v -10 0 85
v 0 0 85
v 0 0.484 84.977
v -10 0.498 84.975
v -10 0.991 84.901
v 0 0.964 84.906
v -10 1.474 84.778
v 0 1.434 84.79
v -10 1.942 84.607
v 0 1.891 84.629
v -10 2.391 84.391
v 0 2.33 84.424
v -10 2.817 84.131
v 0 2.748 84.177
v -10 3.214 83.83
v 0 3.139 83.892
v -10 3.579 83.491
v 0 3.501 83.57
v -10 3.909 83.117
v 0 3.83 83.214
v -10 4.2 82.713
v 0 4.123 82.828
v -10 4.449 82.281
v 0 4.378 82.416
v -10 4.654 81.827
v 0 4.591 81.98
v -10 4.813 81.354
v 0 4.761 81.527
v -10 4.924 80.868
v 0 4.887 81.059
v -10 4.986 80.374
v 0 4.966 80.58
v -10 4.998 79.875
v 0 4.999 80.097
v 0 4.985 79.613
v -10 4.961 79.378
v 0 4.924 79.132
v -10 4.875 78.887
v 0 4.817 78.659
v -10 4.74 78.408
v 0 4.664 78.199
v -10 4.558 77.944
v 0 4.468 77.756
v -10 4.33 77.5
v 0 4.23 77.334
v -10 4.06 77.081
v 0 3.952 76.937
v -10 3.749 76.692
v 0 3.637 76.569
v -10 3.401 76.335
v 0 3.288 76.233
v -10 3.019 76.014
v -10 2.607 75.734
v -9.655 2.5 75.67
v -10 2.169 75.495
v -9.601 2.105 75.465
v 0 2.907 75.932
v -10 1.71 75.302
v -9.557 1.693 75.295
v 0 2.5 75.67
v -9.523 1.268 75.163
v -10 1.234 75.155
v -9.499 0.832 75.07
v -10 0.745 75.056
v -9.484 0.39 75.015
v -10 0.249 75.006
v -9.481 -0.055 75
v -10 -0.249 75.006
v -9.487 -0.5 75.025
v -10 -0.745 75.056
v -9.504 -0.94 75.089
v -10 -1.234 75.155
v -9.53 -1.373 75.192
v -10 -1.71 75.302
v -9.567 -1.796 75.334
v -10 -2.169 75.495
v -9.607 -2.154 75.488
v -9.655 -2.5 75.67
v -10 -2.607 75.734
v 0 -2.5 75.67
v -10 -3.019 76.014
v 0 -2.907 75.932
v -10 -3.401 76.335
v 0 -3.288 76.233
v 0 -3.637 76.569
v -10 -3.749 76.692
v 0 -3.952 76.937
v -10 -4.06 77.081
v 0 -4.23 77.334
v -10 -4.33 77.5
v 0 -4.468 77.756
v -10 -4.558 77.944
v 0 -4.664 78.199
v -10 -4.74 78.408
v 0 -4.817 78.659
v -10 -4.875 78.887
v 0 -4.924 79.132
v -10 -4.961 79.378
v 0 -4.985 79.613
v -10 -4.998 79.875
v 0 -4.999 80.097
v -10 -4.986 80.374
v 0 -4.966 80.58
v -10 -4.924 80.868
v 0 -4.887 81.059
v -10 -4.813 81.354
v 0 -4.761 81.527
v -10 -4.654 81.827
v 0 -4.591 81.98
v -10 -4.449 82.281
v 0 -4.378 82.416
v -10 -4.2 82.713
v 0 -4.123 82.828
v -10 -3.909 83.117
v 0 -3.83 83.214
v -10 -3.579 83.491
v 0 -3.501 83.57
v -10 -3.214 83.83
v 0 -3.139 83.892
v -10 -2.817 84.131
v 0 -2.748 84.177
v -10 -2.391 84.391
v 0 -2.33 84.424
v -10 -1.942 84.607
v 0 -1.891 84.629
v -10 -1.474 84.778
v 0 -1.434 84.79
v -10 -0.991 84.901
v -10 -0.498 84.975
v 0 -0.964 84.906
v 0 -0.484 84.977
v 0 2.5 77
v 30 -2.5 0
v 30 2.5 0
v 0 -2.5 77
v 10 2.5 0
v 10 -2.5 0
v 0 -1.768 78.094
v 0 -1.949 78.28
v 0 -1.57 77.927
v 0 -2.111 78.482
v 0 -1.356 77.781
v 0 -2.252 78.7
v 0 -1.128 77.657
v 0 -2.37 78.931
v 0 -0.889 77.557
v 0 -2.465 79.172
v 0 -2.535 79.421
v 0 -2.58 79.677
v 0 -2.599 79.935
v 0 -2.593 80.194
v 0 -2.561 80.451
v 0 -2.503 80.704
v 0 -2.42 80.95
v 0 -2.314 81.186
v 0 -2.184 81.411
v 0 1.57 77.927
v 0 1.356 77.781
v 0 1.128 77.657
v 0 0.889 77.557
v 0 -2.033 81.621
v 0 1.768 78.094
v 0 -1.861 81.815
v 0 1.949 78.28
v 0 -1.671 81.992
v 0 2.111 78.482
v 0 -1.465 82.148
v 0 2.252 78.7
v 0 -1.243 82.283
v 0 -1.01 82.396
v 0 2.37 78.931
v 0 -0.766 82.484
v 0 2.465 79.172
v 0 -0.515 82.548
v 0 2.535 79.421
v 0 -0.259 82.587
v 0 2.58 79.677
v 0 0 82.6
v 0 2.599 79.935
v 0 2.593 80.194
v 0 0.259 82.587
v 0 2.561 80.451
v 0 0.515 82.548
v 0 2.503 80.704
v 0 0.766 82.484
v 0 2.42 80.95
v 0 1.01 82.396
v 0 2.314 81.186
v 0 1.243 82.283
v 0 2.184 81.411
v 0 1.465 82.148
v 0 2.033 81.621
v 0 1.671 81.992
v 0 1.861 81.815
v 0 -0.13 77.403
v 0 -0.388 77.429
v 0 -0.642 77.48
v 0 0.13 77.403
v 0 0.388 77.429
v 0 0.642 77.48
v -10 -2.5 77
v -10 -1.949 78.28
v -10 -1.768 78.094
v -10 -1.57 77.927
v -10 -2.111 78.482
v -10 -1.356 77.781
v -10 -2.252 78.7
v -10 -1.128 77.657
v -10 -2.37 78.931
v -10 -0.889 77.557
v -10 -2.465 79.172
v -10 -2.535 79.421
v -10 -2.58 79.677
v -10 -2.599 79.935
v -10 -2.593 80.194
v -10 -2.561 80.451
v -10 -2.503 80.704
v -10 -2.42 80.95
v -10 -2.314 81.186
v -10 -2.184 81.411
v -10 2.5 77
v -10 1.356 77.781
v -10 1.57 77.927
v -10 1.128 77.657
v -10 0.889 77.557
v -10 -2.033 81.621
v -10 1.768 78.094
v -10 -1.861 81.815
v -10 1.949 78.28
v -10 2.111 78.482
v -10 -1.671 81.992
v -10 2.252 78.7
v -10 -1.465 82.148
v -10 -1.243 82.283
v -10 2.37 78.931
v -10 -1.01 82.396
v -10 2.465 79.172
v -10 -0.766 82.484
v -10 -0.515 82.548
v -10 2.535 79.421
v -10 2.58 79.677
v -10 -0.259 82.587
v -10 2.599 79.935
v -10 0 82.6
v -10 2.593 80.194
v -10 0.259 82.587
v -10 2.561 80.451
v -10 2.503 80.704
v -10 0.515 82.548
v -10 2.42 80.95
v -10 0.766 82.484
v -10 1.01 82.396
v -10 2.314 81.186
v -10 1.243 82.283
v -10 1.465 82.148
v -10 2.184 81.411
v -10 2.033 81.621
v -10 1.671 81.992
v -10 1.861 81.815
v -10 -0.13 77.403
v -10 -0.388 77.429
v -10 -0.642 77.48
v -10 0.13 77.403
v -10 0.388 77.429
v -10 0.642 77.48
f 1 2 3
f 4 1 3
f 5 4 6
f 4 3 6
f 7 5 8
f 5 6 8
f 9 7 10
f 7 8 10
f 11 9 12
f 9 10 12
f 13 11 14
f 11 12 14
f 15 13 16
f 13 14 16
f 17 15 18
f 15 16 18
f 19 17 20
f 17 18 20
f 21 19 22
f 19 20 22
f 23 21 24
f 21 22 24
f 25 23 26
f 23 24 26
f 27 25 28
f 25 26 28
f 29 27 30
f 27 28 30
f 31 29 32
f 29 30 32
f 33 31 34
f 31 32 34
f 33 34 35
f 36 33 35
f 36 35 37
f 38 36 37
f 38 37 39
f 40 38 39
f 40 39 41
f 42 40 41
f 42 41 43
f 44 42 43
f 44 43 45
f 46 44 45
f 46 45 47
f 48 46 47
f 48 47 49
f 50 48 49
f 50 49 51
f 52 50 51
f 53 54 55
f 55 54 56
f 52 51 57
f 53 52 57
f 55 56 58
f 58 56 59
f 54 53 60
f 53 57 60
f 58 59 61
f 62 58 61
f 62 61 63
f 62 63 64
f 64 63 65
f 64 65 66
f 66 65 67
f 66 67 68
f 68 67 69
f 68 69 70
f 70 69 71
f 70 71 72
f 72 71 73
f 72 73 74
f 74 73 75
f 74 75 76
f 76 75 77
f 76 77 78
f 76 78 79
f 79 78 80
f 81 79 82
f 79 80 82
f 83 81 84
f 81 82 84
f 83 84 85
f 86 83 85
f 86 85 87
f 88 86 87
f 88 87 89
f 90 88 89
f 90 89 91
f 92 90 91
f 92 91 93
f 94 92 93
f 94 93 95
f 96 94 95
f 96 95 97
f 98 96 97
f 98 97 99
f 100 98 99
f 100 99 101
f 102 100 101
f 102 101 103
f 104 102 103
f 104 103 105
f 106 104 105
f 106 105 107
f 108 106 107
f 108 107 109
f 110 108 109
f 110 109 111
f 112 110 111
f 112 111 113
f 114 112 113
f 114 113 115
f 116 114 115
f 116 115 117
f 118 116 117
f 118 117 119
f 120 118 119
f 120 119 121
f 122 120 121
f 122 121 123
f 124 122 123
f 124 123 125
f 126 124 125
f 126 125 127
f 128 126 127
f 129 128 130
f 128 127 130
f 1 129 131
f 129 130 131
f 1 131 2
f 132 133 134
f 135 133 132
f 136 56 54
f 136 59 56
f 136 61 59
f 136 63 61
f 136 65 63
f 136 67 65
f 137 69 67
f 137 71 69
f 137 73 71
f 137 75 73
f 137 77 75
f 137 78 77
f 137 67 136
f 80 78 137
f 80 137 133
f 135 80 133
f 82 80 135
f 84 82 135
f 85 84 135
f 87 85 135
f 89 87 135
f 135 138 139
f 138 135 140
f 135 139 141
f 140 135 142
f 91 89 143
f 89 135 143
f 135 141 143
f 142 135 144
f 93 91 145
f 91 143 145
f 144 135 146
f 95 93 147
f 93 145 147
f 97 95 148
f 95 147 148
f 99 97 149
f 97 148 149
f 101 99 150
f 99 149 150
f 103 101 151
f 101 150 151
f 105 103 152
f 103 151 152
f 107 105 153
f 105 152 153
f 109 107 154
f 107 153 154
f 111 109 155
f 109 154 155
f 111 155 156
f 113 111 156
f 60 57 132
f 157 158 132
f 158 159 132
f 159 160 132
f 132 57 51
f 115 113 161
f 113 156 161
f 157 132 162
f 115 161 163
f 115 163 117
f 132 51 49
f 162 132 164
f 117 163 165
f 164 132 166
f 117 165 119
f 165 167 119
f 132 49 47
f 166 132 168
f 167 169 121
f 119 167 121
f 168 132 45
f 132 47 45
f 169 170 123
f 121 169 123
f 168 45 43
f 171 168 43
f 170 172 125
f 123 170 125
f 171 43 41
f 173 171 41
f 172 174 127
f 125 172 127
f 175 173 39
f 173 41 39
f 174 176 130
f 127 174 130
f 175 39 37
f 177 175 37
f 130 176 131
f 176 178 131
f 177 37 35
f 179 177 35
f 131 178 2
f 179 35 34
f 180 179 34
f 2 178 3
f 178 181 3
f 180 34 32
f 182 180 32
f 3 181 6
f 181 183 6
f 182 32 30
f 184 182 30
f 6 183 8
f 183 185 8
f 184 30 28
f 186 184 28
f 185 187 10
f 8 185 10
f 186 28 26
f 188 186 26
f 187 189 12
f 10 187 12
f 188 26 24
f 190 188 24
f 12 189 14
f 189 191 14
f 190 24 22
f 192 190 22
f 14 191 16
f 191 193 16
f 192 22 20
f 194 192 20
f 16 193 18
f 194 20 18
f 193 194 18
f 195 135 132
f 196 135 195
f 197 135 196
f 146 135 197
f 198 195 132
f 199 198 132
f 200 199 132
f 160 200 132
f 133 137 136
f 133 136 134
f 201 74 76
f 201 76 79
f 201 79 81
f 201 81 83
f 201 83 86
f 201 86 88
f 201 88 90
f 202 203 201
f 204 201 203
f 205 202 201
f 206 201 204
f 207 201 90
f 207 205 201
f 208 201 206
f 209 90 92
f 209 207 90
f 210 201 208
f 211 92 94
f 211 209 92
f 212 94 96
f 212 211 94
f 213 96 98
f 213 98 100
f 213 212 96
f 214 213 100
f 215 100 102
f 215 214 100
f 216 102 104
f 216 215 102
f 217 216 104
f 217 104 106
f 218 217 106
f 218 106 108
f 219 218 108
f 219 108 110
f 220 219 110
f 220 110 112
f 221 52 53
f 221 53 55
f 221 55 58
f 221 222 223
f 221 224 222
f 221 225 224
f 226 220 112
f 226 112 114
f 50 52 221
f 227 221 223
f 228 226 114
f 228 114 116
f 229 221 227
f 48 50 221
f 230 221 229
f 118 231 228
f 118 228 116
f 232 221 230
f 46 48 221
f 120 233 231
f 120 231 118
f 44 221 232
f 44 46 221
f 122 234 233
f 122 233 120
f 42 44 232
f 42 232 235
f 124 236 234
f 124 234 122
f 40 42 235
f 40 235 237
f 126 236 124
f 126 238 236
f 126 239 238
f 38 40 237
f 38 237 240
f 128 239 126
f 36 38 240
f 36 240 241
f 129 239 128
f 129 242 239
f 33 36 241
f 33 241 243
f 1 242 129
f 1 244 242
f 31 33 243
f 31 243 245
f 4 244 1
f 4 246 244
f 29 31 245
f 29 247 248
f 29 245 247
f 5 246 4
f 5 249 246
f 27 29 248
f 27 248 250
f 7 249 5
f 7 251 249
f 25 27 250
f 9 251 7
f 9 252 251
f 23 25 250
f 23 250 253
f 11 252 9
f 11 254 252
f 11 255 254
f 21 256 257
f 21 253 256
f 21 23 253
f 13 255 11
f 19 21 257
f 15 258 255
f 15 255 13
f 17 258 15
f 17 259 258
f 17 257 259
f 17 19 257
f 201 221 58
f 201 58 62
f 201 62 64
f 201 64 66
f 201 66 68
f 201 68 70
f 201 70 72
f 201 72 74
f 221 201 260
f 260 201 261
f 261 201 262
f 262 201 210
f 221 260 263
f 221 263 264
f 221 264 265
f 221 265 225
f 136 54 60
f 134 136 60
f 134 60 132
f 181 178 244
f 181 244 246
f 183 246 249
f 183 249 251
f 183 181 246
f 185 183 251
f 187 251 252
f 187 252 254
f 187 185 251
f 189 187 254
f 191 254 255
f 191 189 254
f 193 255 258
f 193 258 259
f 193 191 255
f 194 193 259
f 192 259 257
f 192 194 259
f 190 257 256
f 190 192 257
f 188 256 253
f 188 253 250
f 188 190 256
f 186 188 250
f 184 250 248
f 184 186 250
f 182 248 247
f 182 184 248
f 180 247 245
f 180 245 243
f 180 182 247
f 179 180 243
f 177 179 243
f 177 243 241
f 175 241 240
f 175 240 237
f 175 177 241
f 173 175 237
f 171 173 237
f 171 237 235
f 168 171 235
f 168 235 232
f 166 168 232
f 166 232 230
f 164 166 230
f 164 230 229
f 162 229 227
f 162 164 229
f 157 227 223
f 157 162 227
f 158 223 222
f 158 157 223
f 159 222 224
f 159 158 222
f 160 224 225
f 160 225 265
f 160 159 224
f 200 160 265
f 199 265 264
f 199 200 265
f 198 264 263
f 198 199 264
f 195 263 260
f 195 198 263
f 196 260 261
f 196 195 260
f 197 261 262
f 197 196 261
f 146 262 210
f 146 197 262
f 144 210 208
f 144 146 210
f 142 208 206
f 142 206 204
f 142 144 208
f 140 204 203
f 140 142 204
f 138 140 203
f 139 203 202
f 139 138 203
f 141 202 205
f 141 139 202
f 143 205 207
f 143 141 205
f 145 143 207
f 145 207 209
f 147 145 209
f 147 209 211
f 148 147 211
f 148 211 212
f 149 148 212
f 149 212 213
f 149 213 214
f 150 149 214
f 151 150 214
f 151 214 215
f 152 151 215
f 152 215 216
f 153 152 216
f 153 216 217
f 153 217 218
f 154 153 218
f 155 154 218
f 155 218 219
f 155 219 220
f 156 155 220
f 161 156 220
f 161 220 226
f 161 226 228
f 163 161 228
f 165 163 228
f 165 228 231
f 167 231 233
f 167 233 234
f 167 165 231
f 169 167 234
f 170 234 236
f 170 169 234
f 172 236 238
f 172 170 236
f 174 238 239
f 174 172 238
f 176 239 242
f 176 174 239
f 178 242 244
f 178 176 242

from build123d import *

# Parameters (mm, degrees)
EXTRUDE_DEPTH = 2.5
TUBE_R        = 5
TUBE_R_2      = 2.6
TUBE_DEPTH    = 10


with BuildPart() as extrude_body:
    # Sketch → Extrude (new body, symmetric)
    with BuildSketch(Plane.XZ):
        Polygon((-10, 77), (10, 0), (30, 0), (0, 77), align=None)
    extrude(amount=EXTRUDE_DEPTH, both=True)


with BuildPart() as fusion:
    # Tube → Tube (new body)
    with BuildSketch(Plane(origin=(0, 0, 80), x_dir=(0, 0, 1), z_dir=(-1, 0, 0))):
        Circle(TUBE_R)
        Circle(TUBE_R_2, mode=Mode.SUBTRACT)
    extrude(amount=TUBE_DEPTH)

    # Fusion: union Extrude body
    add(extrude_body.part)


solid = fusion.part
